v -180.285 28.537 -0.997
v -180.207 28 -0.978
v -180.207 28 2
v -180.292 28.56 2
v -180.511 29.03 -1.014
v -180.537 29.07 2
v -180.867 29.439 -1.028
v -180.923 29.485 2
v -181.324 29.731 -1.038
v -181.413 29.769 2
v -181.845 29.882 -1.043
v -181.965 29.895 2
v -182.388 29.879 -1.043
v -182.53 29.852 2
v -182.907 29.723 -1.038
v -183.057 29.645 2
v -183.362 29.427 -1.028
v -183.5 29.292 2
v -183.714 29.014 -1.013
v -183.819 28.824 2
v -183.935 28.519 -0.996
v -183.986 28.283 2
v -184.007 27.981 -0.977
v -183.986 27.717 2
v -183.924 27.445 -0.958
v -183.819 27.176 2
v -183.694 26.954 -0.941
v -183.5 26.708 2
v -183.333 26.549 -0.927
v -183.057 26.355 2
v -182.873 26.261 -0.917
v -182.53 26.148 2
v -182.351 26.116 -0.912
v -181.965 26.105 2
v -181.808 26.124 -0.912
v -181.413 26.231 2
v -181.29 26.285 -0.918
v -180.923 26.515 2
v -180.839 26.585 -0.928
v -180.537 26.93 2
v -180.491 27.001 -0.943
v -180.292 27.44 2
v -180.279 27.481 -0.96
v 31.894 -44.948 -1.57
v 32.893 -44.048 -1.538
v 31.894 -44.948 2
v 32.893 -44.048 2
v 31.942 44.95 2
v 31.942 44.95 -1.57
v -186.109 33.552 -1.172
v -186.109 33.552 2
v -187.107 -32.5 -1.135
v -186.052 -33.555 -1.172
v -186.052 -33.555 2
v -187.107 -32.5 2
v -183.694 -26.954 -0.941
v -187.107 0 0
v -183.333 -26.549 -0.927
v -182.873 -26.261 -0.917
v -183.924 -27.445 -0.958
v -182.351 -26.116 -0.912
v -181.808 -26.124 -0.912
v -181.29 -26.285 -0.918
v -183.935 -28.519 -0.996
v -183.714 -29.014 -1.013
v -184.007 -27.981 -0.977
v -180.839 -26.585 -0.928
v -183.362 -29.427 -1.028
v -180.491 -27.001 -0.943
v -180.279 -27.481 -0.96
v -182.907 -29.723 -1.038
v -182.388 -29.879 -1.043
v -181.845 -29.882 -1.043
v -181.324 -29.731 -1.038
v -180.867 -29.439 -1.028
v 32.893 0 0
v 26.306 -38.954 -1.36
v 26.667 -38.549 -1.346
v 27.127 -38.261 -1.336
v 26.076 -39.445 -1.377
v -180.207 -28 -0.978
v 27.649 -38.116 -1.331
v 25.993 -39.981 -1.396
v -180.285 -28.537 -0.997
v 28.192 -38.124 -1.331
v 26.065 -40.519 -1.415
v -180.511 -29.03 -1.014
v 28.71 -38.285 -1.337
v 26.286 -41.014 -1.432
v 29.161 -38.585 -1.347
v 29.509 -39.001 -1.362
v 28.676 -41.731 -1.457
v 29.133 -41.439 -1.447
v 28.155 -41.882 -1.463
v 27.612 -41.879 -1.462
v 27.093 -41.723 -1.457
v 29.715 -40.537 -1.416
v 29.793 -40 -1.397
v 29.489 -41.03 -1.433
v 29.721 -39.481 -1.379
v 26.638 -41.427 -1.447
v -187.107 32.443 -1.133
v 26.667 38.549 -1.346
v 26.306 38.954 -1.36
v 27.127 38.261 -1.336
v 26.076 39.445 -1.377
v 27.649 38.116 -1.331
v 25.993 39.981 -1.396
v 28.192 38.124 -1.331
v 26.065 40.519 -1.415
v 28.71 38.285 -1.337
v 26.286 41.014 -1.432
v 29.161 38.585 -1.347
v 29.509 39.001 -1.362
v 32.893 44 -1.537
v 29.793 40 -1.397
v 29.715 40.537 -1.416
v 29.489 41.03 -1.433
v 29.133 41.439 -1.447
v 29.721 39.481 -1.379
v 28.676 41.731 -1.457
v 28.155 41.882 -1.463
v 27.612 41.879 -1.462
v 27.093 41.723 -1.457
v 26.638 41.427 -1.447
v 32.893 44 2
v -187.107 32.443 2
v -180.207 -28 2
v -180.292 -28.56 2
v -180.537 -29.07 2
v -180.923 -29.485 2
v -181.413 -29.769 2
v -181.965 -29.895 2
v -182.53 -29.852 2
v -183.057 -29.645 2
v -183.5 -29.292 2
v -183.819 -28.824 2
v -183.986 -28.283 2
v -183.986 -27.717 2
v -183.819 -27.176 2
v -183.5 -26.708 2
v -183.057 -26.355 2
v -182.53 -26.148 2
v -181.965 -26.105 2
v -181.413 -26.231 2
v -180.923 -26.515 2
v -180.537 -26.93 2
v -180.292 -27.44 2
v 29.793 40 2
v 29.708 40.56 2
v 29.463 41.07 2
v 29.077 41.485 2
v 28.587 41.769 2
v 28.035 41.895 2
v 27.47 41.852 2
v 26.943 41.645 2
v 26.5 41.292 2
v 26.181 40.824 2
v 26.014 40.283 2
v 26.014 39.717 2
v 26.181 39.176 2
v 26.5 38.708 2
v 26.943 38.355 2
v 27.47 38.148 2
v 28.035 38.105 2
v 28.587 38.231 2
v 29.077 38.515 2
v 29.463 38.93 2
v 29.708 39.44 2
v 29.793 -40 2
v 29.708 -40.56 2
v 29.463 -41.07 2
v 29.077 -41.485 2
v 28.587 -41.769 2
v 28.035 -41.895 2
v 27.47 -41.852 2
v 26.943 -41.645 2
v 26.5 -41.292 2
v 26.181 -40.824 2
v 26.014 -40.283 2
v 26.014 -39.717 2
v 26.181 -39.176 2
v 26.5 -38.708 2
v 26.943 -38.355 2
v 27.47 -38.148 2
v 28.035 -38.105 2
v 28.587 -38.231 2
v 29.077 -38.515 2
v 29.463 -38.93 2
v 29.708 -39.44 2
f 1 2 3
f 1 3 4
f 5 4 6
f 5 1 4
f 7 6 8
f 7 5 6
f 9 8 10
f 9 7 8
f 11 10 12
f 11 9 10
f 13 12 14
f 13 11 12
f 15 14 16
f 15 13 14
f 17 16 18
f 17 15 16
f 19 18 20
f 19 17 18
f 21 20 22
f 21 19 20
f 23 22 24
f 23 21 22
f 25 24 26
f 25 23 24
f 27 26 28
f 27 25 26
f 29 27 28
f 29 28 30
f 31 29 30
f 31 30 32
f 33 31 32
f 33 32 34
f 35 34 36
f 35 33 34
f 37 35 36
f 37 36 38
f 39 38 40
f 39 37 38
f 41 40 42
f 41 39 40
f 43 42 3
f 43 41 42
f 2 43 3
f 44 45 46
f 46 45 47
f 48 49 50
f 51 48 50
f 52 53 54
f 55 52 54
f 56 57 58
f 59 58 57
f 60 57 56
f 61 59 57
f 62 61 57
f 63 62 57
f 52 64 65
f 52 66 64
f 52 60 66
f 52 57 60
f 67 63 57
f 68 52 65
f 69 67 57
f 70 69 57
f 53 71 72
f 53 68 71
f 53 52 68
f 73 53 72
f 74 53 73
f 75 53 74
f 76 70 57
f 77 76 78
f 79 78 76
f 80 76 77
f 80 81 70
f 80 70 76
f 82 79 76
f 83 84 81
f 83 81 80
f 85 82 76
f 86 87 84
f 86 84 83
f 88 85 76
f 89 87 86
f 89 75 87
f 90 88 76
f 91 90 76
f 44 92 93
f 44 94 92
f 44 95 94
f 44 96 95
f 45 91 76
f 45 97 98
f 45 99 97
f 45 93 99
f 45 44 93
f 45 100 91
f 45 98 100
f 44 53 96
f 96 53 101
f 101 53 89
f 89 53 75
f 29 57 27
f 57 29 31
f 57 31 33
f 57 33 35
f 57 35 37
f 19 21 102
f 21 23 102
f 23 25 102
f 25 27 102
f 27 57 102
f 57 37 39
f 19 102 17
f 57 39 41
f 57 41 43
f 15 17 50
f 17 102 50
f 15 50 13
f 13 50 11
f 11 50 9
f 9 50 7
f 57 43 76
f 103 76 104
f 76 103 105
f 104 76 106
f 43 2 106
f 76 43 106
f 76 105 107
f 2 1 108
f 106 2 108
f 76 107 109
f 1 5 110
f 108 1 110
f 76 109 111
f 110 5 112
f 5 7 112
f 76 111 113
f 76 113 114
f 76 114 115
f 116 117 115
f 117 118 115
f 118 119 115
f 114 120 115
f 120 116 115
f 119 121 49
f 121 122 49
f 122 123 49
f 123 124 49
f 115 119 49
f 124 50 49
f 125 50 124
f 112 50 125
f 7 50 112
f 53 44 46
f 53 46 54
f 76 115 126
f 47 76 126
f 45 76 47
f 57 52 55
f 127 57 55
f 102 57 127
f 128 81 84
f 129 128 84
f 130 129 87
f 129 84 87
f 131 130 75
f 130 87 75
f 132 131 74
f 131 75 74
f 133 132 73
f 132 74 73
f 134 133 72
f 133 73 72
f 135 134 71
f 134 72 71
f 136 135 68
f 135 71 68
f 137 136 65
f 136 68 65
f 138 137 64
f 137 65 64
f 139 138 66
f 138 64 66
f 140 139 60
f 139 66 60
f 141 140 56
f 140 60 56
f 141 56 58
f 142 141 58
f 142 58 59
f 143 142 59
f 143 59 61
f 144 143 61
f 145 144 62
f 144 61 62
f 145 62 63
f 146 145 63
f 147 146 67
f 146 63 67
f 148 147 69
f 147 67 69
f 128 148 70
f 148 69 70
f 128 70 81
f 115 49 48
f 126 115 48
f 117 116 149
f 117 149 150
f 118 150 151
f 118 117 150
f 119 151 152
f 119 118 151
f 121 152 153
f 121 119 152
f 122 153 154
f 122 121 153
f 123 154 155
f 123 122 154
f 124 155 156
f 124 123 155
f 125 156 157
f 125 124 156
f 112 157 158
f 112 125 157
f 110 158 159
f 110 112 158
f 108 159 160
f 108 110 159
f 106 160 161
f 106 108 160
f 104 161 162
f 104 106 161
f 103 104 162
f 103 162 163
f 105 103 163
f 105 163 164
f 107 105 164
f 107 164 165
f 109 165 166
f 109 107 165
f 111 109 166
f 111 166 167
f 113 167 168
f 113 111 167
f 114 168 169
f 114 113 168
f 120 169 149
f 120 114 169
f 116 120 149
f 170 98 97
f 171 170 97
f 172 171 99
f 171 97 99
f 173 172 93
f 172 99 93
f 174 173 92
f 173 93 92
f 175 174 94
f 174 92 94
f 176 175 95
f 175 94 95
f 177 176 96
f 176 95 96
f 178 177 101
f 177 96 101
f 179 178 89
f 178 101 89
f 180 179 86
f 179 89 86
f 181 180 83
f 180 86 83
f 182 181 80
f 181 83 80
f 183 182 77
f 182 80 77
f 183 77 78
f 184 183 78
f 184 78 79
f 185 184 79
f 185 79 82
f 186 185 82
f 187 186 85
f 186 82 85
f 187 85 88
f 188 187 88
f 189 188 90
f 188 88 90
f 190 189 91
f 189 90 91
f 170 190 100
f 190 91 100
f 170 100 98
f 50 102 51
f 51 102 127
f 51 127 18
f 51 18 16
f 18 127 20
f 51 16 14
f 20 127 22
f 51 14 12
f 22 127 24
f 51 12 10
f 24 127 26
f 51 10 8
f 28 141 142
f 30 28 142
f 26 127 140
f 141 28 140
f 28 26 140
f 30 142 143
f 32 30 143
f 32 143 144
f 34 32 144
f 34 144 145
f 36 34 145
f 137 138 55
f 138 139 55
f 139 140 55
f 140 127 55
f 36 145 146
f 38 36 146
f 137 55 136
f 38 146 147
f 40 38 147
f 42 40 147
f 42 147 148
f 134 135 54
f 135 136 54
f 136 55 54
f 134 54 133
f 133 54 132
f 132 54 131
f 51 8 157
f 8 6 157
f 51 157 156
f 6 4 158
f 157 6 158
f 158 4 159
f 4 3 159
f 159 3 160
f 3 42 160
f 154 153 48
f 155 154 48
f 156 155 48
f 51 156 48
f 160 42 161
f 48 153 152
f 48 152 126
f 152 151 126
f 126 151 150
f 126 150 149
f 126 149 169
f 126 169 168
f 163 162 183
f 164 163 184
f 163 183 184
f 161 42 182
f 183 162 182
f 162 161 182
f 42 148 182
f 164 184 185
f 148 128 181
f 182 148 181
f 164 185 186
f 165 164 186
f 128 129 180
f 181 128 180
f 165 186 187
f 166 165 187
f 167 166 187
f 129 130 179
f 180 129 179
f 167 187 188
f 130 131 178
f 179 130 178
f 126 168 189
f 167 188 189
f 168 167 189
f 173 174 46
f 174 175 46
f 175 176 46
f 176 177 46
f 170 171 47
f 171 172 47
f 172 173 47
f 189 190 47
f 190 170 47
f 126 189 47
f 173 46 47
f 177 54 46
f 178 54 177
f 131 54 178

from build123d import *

# Parameters (mm, degrees)
ESQUISSE1_R      = 1.9
EXTRUSION1_DEPTH = 2
D_POUILLE2_ANGLE = 2
CHANFREIN1_SIZE  = 1
CHANFREIN1_SIZE2 = 1.056596466
CHANFREIN2_SIZE  = 1
CHANFREIN2_SIZE2 = 1.056596466
CHANFREIN4_SIZE  = 1
CHANFREIN4_SIZE2 = 0.951621439
CHANFREIN5_SIZE  = 1
CHANFREIN5_SIZE2 = 0.951621439


with BuildPart() as part:
    # Esquisse1 → Extrusion1 (new body)
    with BuildSketch(Plane.XY):
        Polygon((32.89280914, 0), (32.89280914, 45), (-187.10719086, 33.5), (-187.10719086, 0), align=None)
        with Locations((-182.10719086, 28)):
            Circle(ESQUISSE1_R, mode=Mode.SUBTRACT)
        with Locations((27.89280914, 40)):
            Circle(ESQUISSE1_R, mode=Mode.SUBTRACT)
    extrude(amount=EXTRUSION1_DEPTH)

    # Dépouille2
    d_pouille2_faces = [part.faces().sort_by_distance(p)[0] for p in [
        (-71.721493892, 19.727903034, 0),
    ]]
    draft(d_pouille2_faces, Plane(origin=(32.89280914, 0, 2), x_dir=(-1, 0, 0), z_dir=(0, -1, 0)), D_POUILLE2_ANGLE)

    # Symétrie1: part across plane


with BuildPart() as part_1:
    add(part.part)
    add(part.part.mirror(Plane(origin=(32.89280914, 0, 2), x_dir=(0, 0, 1), z_dir=(0, 1, 0))))

    # Chanfrein1
    chanfrein1_edges = [part_1.edges().sort_by_distance(p)[0] for p in [
        (-187.10719086, 33.5, 0.415077111),
    ]]
    chanfrein1_side = [part_1.faces().sort_by_distance(p)[0] for p in [
        (-74.922898918, 39.364178897, 0.312686291),
    ]]
    chamfer(chanfrein1_edges, length=CHANFREIN1_SIZE, length2=CHANFREIN1_SIZE2, reference=chanfrein1_side[0])

    # Chanfrein2
    chanfrein2_edges = [part_1.edges().sort_by_distance(p)[0] for p in [
        (-187.10719086, -33.5, 0.415077111),
    ]]
    chanfrein2_side = [part_1.faces().sort_by_distance(p)[0] for p in [
        (-187.10719086, -0.646362154, 0.690599114),
    ]]
    chamfer(chanfrein2_edges, length=CHANFREIN2_SIZE, length2=CHANFREIN2_SIZE2, reference=chanfrein2_side[0])

    # Chanfrein4
    chanfrein4_edges = [part_1.edges().sort_by_distance(p)[0] for p in [
        (32.89280914, -45, 0.214282686),
    ]]
    chanfrein4_side = [part_1.faces().sort_by_distance(p)[0] for p in [
        (-74.416841112, -39.390631919, 0.312224411),
    ]]
    chamfer(chanfrein4_edges, length=CHANFREIN4_SIZE, length2=CHANFREIN4_SIZE2, reference=chanfrein4_side[0])

    # Chanfrein5
    chanfrein5_edges = [part_1.edges().sort_by_distance(p)[0] for p in [
        (32.89280914, 45, 0.214282686),
    ]]
    chanfrein5_side = [part_1.faces().sort_by_distance(p)[0] for p in [
        (32.89280914, 0.608982965, 0.574960444),
    ]]
    chamfer(chanfrein5_edges, length=CHANFREIN5_SIZE, length2=CHANFREIN5_SIZE2, reference=chanfrein5_side[0])


solid = part_1.part
